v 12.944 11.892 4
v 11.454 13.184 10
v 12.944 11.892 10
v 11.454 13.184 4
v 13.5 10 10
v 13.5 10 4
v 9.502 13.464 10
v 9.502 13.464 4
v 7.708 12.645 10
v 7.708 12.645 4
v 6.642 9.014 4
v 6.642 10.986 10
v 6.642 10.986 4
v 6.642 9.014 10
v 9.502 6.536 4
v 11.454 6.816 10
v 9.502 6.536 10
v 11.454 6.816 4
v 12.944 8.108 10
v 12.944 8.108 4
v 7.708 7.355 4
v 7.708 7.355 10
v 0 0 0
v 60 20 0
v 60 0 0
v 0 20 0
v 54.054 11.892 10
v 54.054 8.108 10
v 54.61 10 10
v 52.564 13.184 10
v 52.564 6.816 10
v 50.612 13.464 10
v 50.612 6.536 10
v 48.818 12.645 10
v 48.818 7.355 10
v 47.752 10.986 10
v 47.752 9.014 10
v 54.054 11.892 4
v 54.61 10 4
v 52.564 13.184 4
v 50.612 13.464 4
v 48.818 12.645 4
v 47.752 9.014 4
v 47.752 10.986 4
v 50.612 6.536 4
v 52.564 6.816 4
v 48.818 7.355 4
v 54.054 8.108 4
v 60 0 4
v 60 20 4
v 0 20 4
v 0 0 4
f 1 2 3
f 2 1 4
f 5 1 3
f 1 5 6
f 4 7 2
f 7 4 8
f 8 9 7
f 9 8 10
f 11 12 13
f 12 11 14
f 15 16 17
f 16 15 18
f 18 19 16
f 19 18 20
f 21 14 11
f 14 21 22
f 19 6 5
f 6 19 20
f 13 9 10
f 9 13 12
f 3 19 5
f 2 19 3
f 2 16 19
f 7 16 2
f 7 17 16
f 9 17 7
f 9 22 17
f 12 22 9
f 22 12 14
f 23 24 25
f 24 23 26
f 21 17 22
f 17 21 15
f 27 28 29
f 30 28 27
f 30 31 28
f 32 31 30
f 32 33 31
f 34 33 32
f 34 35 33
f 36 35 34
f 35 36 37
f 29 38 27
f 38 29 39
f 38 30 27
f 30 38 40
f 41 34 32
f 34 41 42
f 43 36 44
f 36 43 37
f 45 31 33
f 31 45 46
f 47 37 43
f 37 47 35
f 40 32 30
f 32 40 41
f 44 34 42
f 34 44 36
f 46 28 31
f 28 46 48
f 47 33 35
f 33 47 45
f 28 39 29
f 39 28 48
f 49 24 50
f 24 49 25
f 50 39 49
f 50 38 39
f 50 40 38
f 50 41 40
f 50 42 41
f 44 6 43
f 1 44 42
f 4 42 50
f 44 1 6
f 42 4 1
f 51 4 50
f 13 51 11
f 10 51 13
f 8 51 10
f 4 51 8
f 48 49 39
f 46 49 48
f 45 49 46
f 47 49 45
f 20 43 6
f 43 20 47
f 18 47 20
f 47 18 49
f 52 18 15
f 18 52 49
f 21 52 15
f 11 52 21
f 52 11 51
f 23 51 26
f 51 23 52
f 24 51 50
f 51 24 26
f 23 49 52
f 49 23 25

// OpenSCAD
union() {
	cube(size = [60, 20, 4]);
	translate(v = [10, 10, 0]) {
		union() {
			cylinder(h = 10, r = 3.5000000000);
			translate(v = [41.1100000000, 0, 0]) {
				cylinder(h = 10, r = 3.5000000000);
			}
		}
	}
}
